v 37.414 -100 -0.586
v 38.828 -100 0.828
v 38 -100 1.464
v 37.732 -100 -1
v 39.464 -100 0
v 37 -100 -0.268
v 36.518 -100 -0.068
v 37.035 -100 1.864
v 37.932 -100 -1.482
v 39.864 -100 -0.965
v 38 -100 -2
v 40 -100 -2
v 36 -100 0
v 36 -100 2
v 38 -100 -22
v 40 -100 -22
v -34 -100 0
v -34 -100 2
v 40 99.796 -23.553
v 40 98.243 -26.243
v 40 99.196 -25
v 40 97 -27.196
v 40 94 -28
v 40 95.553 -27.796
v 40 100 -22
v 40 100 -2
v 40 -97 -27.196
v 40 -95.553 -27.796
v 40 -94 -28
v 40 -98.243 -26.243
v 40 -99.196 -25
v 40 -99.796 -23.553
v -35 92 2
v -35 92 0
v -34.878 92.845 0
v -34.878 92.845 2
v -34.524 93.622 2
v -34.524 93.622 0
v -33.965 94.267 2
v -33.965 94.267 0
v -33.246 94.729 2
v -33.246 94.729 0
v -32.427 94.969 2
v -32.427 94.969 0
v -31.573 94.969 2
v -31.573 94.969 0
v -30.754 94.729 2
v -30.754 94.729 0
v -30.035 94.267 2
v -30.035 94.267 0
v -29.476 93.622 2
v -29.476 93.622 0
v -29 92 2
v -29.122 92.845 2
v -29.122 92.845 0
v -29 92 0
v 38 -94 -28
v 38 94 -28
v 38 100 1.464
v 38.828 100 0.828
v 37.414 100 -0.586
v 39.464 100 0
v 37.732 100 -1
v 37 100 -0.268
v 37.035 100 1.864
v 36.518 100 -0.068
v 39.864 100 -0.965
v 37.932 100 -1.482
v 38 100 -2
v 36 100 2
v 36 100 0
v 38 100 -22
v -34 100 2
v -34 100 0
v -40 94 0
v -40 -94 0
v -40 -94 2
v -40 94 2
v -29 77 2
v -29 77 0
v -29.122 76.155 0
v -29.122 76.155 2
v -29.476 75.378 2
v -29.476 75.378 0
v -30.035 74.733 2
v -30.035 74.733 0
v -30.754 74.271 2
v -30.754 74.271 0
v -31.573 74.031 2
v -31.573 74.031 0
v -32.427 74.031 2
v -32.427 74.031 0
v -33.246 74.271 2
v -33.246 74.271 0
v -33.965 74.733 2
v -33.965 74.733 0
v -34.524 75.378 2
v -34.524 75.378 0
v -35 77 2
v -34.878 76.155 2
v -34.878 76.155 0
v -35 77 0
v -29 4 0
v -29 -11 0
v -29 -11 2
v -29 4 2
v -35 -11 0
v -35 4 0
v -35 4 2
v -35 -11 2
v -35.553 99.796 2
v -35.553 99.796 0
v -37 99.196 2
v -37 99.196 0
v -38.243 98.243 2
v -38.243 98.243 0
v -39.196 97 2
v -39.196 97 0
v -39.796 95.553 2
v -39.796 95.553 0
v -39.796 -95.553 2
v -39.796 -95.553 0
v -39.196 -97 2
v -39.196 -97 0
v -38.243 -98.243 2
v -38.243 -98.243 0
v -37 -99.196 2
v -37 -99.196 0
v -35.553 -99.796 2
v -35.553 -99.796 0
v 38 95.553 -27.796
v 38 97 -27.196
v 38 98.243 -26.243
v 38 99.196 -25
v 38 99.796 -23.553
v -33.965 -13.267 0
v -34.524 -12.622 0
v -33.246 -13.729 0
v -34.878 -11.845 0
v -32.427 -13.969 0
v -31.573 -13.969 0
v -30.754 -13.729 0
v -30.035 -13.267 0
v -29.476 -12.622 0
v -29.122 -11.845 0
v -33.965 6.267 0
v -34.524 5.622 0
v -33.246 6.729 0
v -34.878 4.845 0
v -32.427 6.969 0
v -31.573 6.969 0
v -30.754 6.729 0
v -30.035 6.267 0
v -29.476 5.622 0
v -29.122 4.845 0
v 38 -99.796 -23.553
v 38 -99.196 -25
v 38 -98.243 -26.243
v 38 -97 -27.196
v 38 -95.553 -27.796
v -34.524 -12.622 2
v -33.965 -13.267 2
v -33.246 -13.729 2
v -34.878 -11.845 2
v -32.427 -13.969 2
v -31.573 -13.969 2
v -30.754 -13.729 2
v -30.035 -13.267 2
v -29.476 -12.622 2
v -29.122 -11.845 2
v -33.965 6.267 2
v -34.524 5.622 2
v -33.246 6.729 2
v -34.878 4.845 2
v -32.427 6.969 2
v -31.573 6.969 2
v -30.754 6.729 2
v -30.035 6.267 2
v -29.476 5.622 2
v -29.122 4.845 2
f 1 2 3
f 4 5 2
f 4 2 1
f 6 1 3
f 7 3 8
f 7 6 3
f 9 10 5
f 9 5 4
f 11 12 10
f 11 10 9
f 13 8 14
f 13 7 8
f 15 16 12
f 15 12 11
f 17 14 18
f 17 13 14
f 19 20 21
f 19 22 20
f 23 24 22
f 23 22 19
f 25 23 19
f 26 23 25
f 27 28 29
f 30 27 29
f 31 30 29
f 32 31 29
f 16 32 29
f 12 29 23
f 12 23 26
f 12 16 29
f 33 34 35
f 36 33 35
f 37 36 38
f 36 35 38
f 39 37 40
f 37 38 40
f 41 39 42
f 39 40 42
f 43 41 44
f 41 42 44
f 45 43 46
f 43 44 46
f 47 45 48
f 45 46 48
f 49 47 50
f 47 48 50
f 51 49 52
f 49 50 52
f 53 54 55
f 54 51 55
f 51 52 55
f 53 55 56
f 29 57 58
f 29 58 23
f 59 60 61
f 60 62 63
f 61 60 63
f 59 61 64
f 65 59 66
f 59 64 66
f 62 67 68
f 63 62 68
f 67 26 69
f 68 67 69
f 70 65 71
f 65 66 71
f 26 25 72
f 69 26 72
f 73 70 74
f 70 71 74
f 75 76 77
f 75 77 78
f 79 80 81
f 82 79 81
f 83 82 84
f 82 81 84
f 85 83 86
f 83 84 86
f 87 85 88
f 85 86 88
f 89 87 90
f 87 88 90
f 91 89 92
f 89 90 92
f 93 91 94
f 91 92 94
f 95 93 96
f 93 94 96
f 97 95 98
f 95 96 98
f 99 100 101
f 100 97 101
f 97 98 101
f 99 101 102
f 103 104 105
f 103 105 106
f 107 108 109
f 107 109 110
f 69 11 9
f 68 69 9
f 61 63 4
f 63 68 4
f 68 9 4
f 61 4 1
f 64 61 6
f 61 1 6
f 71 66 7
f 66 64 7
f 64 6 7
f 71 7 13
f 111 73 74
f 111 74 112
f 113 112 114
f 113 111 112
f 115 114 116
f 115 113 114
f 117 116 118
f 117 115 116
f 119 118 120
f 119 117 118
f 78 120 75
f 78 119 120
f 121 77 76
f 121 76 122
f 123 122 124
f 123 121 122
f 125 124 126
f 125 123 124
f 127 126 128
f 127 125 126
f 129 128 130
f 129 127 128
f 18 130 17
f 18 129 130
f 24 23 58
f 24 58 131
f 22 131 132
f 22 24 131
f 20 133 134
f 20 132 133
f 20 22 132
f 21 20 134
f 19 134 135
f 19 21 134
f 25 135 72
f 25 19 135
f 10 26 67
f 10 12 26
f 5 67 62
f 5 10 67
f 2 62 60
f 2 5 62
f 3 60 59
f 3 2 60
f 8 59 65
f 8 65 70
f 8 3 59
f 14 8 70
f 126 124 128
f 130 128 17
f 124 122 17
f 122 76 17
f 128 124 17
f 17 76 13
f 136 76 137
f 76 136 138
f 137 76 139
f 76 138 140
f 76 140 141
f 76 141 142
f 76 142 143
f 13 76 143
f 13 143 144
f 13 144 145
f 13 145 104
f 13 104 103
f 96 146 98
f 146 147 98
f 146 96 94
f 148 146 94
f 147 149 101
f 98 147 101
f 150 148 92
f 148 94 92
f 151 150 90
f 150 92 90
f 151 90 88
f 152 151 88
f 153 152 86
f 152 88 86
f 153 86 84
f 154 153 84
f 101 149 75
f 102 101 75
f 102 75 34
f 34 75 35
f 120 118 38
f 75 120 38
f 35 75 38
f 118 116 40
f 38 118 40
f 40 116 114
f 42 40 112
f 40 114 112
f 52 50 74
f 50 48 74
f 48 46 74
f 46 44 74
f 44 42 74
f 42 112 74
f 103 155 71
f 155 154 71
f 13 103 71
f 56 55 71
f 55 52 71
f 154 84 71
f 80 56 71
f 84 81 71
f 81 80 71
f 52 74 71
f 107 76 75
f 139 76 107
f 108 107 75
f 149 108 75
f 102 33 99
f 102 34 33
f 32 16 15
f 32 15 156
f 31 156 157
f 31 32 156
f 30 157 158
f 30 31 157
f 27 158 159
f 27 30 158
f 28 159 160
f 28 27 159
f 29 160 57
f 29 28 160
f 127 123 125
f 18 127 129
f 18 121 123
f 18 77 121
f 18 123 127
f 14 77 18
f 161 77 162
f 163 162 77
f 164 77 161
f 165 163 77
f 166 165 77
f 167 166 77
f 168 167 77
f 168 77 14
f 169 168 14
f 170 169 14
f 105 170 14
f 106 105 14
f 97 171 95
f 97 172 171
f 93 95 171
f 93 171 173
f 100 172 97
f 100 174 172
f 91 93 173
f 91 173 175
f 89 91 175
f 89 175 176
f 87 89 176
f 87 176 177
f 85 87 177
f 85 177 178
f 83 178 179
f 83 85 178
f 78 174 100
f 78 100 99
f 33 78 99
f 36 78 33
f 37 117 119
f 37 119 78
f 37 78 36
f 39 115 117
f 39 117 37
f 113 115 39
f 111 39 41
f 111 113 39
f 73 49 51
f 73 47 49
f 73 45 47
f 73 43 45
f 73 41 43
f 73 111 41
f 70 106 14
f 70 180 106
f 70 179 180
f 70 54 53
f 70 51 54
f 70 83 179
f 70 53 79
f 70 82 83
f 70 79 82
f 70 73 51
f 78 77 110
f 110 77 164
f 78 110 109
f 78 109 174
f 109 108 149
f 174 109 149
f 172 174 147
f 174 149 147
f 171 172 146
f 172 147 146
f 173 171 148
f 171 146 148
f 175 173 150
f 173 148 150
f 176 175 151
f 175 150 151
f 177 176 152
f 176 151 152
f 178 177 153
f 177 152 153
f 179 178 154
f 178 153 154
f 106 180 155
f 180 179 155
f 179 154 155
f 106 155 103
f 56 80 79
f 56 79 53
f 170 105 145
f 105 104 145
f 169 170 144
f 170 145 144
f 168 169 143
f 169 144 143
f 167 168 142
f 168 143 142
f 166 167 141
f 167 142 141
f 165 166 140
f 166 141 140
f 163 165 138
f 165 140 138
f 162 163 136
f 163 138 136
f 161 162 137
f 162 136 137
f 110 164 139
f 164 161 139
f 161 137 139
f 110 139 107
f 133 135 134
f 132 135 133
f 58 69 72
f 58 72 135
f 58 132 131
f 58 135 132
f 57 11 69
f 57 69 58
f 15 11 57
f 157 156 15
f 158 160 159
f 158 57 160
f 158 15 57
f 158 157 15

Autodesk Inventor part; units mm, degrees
ref_plane "YZ Plane" through (0, 0, 0) normal (1, 0, 0) x (0, 1, 0)
ref_plane "XZ Plane" through (0, 0, 0) normal (0, 1, 0) x (-1, 0, 0)
ref_plane "XY Plane" through (0, 0, 0) normal (0, 0, 1) x (1, 0, 0)
sketch "Sketch1" plane through (0, 0, 0) normal (0, 0, 1) x (1, 0, 0)
  line L0 (40, -100) -> (-40, -100)
  line L1 (-40, -100) -> (-40, 100)
  line L2 (-40, 100) -> (40, 100)
  line L3 (40, 100) -> (40, -100)
  line L4 (40, 100) -> (-40, -100) construction
  point P0 (0, 0)
  point P1 (0, 0)
  dimension "d1" = 200
  dimension "d2" = 80
extrude "Plate1" add sketch "Sketch1" along normal blind 2
sketch "Sketch5" plane through (0, 0, 0) normal (0, 0, 1) x (1, 0, 0)
  circle A0 centre (-32, 92) radius 3
  circle A1 centre (-32, 4) radius 3
  line L0 (-40, -100) -> (-40, 100) projected
  line L1 (40, -100) -> (-40, -100) projected
  line L2 (40, 100) -> (40, -100) projected
  line L3 (-40, 100) -> (40, 100) projected
  line L4 (-32, 92) -> (-32, 77) construction
  line L5 (-35, 92) -> (-35, 77)
  line L6 (-29, 77) -> (-29, 92)
  arc A2 (-29, 92) -> (-35, 92) centre (-32, 92) ccw
  arc A3 (-35, 77) -> (-29, 77) centre (-32, 77) ccw
  line L7 (-32, 4) -> (-32, -11) construction
  line L8 (-35, 4) -> (-35, -11)
  line L9 (-29, -11) -> (-29, 4)
  arc A4 (-29, 4) -> (-35, 4) centre (-32, 4) ccw
  arc A5 (-35, -11) -> (-29, -11) centre (-32, -11) ccw
  point P0 (0, 0)
  point P1 (-32, 84.5)
  point P2 (-32, -3.5)
  point P3 (-29, 4)
  dimension "d33" = 88
  dimension "d34" = 6
  dimension "d35" = 8
  dimension "d36" = 8
  dimension "d50" = 15
extrude "Cut1" cut sketch "Sketch5" along normal blind 2 contours A0 | L6 A3 L5 A0 | A1 | L9 A5 L8 A1
sketch "Sketch6" plane through (38, 100, 2) normal (1, 0, 0) x (0, 1, 0)
  line L0 (-200, 0) -> (0, 0)
  line L1 (0, 0) -> (0, 30)
  line L2 (0, 30) -> (-200, 30)
  line L3 (-200, 30) -> (-200, 0)
edge flange "Flange2" height 30 angle 90 thickness 2 bend radius 2 thickness toward (1, 0, 0) relief tear relief width 2 relief depth 1 edges at (40, 0, 2) wall of the first edge with corners at (38, -100, 2) (38, 100, 2) (38, 100, -28) (38, -100, -28)
bend "Bend2"
corner "Corner2"
fillet "Corner Round1" radius 6 4 edges at (-40, 100, 1) (39, -100, -28) (39, 100, -28) (-40, -100, 1)
equation "\"d36\" = d35"
equation "\"d37\" = Thickness"
equation "\"d0\" = Thickness"
equation "\"d39\" = BendReliefWidth"
equation "\"d40\" = BendReliefDepth"
equation "\"d41\" = MinimumRemnant"
equation "\"d42\" = TransitionRadius"
equation "\"d45\" = BendRadius"
equation "\"d46\" = CornerReliefSize"
equation "\"d47\" = GapSize"
equation "\"d48\" = JacobiRadiusSize"
equation "\"BendRadius\" = Thickness"
equation "\"BendReliefWidth\" = Thickness"
equation "\"BendReliefDepth\" = 0.5 * Thickness"
equation "\"CornerReliefSize\" = 4 * Thickness"
equation "\"MinimumRemnant\" = 2 * Thickness"
equation "\"TransitionRadius\" = BendRadius"
equation "\"JacobiRadiusSize\" = BendRadius"
equation "\"GapSize\" = Thickness"
equation "\"Thickness\" = 2"
properties part number "GNH 017  Pulse compensator" material "Stainless Steel"
